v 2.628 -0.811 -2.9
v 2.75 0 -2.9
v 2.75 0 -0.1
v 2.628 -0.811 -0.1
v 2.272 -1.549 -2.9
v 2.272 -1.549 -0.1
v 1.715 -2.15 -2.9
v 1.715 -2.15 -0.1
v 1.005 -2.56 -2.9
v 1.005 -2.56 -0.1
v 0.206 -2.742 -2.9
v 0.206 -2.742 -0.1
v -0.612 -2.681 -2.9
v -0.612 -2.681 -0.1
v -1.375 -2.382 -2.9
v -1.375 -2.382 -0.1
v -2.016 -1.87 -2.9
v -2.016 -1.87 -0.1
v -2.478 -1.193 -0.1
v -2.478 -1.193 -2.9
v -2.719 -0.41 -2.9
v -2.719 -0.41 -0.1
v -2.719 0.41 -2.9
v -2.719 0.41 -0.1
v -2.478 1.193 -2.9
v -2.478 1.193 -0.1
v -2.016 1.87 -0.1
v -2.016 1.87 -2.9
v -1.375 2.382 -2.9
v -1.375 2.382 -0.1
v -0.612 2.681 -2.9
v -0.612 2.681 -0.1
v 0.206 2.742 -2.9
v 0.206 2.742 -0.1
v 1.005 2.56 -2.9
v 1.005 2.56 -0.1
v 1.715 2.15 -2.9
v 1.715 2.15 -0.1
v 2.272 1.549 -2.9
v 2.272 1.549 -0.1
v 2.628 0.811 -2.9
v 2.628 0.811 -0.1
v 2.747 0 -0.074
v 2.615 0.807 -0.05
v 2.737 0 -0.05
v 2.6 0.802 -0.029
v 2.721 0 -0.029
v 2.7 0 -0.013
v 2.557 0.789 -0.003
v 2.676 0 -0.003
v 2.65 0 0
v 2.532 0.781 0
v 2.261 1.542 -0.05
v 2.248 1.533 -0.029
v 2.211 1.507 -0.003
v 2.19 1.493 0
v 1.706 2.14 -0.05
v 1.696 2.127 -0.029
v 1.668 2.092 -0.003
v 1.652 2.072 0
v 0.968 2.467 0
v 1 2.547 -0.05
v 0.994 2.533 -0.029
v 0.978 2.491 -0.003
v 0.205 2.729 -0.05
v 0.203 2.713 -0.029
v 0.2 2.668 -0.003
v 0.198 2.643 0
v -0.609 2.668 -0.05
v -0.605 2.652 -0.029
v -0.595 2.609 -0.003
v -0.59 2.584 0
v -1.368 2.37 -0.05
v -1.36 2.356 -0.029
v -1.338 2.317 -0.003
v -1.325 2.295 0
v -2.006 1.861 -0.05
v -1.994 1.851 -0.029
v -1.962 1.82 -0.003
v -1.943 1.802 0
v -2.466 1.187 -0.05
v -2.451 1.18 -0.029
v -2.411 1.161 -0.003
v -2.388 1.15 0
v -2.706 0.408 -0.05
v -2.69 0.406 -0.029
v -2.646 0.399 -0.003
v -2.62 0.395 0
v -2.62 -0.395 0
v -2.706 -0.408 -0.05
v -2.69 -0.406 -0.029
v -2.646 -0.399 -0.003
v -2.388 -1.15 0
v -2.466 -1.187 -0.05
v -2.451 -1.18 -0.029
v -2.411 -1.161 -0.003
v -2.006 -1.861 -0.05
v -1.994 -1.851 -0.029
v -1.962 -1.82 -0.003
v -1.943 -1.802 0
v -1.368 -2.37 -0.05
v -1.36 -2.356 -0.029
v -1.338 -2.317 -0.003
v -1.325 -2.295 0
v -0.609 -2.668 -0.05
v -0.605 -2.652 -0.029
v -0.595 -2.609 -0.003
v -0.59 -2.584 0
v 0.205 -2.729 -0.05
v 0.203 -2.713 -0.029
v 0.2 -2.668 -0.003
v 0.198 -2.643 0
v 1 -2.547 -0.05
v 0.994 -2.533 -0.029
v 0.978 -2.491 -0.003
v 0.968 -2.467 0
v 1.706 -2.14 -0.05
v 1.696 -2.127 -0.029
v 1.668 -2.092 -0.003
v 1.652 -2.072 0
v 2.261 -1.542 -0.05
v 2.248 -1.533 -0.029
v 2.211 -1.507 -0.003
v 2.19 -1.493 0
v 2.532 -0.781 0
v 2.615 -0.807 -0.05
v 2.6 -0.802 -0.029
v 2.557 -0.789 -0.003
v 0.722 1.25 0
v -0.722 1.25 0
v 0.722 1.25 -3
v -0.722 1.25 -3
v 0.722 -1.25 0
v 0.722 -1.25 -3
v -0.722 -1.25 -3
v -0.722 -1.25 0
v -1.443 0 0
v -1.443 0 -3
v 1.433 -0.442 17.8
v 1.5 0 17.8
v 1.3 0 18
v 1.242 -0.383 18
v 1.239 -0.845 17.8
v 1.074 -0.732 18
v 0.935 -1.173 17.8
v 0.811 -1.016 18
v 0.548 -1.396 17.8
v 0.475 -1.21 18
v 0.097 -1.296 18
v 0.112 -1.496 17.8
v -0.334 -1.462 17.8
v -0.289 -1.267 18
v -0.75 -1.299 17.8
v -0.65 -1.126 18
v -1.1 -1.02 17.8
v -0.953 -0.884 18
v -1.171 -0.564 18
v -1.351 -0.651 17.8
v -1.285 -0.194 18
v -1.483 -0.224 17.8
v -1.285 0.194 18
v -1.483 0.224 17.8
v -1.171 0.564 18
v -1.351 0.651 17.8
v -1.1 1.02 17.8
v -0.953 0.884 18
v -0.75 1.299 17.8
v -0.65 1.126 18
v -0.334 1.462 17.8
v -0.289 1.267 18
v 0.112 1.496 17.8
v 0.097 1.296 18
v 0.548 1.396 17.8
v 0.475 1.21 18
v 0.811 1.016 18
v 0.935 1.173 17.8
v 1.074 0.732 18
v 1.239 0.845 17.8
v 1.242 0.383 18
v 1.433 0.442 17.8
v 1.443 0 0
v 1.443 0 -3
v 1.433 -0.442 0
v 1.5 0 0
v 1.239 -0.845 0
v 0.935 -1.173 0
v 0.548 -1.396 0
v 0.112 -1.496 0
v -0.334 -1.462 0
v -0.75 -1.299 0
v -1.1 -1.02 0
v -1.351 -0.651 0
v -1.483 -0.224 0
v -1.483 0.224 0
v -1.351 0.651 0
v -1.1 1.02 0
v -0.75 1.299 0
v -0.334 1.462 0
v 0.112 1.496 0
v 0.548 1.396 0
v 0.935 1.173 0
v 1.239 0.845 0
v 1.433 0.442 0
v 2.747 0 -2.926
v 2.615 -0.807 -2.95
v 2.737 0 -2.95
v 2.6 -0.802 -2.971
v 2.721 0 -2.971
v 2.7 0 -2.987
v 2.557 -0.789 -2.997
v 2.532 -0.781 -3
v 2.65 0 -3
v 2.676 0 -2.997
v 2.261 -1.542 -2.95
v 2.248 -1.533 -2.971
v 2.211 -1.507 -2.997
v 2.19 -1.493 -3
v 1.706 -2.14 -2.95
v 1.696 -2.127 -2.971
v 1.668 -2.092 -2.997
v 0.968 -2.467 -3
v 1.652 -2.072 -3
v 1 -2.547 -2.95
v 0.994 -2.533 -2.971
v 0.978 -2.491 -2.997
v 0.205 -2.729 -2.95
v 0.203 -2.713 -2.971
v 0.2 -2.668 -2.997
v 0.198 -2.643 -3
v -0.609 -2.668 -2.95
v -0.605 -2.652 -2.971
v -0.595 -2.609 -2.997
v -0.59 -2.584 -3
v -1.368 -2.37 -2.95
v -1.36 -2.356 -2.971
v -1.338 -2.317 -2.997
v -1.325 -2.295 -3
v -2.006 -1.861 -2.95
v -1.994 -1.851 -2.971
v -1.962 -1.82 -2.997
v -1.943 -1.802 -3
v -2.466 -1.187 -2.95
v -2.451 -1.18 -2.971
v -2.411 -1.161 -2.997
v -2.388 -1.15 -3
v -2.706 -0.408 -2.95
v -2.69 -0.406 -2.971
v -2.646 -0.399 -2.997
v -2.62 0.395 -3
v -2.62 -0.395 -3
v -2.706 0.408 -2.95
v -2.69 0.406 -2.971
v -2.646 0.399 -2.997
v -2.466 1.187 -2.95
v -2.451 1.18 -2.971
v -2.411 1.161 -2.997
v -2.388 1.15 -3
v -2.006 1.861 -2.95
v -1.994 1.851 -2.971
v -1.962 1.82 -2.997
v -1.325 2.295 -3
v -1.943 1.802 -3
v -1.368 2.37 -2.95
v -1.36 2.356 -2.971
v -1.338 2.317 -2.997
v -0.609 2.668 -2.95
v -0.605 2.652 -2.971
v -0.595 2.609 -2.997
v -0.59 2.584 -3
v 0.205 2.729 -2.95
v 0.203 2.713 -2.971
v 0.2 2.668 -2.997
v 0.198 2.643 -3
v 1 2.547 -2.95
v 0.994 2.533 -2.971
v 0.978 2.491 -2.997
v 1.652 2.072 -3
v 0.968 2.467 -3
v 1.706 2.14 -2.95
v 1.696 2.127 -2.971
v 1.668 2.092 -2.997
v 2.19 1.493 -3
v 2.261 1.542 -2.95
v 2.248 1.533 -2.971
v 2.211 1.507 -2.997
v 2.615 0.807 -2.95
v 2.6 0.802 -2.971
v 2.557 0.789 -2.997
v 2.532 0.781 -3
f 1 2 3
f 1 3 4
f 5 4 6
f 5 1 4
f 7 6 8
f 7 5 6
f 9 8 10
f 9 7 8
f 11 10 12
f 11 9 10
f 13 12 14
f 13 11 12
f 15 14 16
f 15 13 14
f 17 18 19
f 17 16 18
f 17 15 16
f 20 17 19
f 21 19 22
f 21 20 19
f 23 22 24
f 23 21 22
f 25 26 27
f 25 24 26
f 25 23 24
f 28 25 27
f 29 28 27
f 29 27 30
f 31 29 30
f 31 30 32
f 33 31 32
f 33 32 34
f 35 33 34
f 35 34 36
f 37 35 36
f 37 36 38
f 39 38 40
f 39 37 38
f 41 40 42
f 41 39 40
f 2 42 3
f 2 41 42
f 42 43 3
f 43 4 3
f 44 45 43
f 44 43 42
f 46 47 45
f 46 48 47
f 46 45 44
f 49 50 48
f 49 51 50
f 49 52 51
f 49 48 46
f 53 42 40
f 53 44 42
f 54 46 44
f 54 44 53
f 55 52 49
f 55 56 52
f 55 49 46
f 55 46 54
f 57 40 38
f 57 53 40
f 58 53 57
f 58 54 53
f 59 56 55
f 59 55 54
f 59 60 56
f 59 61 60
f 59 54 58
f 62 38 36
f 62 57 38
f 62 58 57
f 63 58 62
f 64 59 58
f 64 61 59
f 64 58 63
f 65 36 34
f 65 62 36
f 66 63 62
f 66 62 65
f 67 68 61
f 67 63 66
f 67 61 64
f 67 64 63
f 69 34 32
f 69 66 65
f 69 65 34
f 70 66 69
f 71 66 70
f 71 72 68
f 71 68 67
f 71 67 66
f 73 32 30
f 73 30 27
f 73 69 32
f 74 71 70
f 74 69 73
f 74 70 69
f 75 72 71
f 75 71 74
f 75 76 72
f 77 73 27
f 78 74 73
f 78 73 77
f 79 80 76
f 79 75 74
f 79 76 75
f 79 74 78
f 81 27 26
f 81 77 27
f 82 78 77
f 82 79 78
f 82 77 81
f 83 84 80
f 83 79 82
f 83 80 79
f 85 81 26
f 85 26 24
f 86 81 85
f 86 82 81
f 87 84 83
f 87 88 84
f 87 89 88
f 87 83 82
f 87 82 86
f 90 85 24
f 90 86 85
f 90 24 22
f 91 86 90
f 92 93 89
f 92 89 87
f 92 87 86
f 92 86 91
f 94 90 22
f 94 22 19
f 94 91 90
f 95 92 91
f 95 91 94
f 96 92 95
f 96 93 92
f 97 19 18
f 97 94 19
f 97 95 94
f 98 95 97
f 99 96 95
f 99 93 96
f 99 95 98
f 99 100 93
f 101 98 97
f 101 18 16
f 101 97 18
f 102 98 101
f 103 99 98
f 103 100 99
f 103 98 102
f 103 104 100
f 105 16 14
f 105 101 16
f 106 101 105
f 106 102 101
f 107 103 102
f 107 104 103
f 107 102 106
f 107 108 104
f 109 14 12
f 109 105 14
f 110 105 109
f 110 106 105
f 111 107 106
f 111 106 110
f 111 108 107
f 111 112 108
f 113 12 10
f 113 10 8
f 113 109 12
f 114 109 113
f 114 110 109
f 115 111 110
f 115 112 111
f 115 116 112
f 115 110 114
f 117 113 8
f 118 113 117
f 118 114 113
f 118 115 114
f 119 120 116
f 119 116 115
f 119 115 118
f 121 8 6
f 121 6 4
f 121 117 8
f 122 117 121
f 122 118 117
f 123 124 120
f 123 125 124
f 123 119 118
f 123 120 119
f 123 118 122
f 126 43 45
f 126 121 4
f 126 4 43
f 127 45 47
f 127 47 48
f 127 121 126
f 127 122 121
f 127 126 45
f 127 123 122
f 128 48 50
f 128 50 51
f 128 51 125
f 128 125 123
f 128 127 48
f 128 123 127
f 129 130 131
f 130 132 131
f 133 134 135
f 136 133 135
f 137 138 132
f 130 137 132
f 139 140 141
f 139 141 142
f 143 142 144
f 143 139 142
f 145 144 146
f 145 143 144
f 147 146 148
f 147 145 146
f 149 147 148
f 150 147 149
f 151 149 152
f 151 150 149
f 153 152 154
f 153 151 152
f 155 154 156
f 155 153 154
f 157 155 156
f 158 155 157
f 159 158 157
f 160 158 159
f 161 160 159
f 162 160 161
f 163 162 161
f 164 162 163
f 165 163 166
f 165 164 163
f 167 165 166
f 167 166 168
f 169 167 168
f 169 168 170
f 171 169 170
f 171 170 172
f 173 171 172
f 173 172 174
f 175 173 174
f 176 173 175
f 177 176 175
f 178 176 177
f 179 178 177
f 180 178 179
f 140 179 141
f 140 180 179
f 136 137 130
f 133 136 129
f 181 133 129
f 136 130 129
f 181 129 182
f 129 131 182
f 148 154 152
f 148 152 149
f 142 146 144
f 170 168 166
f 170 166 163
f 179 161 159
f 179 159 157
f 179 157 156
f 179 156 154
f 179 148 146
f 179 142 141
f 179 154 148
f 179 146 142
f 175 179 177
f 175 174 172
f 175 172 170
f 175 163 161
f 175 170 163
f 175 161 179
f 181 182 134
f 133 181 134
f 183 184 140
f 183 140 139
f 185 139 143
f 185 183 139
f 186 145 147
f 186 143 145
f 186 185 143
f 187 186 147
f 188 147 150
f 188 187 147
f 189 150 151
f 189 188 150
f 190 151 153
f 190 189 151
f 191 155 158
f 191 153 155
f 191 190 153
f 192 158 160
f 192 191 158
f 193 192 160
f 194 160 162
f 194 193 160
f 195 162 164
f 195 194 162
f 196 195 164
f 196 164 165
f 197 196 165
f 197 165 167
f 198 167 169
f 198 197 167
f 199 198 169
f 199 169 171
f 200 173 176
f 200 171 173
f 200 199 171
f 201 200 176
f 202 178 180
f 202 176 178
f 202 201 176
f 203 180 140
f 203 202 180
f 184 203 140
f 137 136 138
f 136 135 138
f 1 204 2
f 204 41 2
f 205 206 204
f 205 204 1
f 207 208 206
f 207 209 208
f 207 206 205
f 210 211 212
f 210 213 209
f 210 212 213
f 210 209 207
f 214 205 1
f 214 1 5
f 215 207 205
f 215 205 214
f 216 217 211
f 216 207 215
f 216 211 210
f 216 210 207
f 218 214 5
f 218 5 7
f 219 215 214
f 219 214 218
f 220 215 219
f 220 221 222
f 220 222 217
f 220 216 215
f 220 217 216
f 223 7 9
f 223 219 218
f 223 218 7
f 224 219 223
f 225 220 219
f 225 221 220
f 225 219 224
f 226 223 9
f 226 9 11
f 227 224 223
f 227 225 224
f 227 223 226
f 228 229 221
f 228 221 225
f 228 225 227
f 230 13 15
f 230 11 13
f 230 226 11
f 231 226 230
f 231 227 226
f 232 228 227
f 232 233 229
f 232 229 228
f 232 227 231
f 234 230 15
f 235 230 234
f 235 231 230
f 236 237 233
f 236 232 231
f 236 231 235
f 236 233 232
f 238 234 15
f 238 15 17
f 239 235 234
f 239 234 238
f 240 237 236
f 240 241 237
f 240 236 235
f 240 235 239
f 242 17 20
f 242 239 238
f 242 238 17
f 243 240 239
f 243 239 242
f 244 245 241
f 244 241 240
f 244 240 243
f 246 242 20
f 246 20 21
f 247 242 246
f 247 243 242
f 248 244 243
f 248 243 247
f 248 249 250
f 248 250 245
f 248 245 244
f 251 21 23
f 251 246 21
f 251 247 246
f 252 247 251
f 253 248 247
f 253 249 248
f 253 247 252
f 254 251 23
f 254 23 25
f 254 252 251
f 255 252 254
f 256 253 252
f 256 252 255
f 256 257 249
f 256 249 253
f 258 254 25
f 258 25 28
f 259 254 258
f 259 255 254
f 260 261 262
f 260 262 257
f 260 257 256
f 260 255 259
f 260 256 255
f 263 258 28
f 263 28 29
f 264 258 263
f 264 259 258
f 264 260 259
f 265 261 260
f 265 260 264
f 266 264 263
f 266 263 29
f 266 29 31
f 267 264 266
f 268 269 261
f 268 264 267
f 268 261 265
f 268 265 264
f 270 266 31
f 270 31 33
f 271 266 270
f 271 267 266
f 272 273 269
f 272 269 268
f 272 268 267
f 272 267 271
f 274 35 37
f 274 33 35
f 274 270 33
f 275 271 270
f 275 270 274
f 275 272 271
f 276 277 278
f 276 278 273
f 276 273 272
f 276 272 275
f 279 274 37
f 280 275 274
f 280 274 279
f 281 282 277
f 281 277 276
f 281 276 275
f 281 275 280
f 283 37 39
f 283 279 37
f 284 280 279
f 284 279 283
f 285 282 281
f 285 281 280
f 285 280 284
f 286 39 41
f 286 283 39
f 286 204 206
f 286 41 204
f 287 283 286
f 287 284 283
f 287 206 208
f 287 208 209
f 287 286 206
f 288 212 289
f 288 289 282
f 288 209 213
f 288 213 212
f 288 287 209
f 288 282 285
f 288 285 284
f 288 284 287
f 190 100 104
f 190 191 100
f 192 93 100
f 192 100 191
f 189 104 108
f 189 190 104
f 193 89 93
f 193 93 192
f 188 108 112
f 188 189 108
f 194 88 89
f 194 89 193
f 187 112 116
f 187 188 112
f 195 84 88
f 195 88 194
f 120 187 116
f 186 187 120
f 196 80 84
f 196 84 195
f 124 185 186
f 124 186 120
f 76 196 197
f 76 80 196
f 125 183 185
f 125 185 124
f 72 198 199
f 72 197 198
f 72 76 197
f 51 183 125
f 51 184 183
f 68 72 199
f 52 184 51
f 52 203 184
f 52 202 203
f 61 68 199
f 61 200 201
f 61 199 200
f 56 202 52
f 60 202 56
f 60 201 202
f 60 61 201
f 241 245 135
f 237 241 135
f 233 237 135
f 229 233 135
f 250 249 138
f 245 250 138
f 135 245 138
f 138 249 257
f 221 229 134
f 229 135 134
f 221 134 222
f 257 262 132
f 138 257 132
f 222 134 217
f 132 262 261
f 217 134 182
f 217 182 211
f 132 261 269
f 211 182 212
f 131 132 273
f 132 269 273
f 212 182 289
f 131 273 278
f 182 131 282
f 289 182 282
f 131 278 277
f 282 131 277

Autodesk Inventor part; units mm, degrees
ref_plane "YZ Plane" through (0, 0, 0) normal (1, 0, 0) x (0, 1, 0)
ref_plane "XZ Plane" through (0, 0, 0) normal (0, 1, 0) x (-1, 0, 0)
ref_plane "Work Plane1" through (0, 0, -3) normal (0, 0, 1) x (1, 0, 0)
sketch "Sketch1" plane through (0, 0, -3) normal (0, 0, 1) x (1, 0, 0)
  circle A0 centre (0, 0) radius 2.75
extrude "Extrusion3" add sketch "Sketch1" along normal blind 3
fillet "Fillet1" radius 0.1 2 edges at (-2.75, 0, -3) (-2.75, 0, 0)
sketch "Sketch2" plane through (0, 0, -3) normal (0, 0, 1) x (1, 0, 0)
  line L0 (-0.7217, 1.25) -> (0.7217, 1.25)
  line L1 (0.7217, -1.25) -> (-0.7217, -1.25)
  line L2 (-0.7217, -1.25) -> (-1.4434, 0)
  line L3 (0.7217, 1.25) -> (1.4434, 0)
  line L4 (-1.4434, 0) -> (-0.7217, 1.25)
  line L5 (1.4434, 0) -> (0.7217, -1.25)
extrude "Extrusion2" cut sketch "Sketch2" along normal blind 3
sketch "Sketch3" plane through (0, 0, 0) normal (0, 0, 1) x (1, 0, 0)
  circle A0 centre (0, 0) radius 1.5
extrude "Extrusion1" add sketch "Sketch3" along normal blind 18
chamfer "Chamfer1" distance 0.2 angle 45 1 edges at (-1.5, 0, 18)
properties part number "DIN 912 M3 8 mm" material "Stainless Steel"
